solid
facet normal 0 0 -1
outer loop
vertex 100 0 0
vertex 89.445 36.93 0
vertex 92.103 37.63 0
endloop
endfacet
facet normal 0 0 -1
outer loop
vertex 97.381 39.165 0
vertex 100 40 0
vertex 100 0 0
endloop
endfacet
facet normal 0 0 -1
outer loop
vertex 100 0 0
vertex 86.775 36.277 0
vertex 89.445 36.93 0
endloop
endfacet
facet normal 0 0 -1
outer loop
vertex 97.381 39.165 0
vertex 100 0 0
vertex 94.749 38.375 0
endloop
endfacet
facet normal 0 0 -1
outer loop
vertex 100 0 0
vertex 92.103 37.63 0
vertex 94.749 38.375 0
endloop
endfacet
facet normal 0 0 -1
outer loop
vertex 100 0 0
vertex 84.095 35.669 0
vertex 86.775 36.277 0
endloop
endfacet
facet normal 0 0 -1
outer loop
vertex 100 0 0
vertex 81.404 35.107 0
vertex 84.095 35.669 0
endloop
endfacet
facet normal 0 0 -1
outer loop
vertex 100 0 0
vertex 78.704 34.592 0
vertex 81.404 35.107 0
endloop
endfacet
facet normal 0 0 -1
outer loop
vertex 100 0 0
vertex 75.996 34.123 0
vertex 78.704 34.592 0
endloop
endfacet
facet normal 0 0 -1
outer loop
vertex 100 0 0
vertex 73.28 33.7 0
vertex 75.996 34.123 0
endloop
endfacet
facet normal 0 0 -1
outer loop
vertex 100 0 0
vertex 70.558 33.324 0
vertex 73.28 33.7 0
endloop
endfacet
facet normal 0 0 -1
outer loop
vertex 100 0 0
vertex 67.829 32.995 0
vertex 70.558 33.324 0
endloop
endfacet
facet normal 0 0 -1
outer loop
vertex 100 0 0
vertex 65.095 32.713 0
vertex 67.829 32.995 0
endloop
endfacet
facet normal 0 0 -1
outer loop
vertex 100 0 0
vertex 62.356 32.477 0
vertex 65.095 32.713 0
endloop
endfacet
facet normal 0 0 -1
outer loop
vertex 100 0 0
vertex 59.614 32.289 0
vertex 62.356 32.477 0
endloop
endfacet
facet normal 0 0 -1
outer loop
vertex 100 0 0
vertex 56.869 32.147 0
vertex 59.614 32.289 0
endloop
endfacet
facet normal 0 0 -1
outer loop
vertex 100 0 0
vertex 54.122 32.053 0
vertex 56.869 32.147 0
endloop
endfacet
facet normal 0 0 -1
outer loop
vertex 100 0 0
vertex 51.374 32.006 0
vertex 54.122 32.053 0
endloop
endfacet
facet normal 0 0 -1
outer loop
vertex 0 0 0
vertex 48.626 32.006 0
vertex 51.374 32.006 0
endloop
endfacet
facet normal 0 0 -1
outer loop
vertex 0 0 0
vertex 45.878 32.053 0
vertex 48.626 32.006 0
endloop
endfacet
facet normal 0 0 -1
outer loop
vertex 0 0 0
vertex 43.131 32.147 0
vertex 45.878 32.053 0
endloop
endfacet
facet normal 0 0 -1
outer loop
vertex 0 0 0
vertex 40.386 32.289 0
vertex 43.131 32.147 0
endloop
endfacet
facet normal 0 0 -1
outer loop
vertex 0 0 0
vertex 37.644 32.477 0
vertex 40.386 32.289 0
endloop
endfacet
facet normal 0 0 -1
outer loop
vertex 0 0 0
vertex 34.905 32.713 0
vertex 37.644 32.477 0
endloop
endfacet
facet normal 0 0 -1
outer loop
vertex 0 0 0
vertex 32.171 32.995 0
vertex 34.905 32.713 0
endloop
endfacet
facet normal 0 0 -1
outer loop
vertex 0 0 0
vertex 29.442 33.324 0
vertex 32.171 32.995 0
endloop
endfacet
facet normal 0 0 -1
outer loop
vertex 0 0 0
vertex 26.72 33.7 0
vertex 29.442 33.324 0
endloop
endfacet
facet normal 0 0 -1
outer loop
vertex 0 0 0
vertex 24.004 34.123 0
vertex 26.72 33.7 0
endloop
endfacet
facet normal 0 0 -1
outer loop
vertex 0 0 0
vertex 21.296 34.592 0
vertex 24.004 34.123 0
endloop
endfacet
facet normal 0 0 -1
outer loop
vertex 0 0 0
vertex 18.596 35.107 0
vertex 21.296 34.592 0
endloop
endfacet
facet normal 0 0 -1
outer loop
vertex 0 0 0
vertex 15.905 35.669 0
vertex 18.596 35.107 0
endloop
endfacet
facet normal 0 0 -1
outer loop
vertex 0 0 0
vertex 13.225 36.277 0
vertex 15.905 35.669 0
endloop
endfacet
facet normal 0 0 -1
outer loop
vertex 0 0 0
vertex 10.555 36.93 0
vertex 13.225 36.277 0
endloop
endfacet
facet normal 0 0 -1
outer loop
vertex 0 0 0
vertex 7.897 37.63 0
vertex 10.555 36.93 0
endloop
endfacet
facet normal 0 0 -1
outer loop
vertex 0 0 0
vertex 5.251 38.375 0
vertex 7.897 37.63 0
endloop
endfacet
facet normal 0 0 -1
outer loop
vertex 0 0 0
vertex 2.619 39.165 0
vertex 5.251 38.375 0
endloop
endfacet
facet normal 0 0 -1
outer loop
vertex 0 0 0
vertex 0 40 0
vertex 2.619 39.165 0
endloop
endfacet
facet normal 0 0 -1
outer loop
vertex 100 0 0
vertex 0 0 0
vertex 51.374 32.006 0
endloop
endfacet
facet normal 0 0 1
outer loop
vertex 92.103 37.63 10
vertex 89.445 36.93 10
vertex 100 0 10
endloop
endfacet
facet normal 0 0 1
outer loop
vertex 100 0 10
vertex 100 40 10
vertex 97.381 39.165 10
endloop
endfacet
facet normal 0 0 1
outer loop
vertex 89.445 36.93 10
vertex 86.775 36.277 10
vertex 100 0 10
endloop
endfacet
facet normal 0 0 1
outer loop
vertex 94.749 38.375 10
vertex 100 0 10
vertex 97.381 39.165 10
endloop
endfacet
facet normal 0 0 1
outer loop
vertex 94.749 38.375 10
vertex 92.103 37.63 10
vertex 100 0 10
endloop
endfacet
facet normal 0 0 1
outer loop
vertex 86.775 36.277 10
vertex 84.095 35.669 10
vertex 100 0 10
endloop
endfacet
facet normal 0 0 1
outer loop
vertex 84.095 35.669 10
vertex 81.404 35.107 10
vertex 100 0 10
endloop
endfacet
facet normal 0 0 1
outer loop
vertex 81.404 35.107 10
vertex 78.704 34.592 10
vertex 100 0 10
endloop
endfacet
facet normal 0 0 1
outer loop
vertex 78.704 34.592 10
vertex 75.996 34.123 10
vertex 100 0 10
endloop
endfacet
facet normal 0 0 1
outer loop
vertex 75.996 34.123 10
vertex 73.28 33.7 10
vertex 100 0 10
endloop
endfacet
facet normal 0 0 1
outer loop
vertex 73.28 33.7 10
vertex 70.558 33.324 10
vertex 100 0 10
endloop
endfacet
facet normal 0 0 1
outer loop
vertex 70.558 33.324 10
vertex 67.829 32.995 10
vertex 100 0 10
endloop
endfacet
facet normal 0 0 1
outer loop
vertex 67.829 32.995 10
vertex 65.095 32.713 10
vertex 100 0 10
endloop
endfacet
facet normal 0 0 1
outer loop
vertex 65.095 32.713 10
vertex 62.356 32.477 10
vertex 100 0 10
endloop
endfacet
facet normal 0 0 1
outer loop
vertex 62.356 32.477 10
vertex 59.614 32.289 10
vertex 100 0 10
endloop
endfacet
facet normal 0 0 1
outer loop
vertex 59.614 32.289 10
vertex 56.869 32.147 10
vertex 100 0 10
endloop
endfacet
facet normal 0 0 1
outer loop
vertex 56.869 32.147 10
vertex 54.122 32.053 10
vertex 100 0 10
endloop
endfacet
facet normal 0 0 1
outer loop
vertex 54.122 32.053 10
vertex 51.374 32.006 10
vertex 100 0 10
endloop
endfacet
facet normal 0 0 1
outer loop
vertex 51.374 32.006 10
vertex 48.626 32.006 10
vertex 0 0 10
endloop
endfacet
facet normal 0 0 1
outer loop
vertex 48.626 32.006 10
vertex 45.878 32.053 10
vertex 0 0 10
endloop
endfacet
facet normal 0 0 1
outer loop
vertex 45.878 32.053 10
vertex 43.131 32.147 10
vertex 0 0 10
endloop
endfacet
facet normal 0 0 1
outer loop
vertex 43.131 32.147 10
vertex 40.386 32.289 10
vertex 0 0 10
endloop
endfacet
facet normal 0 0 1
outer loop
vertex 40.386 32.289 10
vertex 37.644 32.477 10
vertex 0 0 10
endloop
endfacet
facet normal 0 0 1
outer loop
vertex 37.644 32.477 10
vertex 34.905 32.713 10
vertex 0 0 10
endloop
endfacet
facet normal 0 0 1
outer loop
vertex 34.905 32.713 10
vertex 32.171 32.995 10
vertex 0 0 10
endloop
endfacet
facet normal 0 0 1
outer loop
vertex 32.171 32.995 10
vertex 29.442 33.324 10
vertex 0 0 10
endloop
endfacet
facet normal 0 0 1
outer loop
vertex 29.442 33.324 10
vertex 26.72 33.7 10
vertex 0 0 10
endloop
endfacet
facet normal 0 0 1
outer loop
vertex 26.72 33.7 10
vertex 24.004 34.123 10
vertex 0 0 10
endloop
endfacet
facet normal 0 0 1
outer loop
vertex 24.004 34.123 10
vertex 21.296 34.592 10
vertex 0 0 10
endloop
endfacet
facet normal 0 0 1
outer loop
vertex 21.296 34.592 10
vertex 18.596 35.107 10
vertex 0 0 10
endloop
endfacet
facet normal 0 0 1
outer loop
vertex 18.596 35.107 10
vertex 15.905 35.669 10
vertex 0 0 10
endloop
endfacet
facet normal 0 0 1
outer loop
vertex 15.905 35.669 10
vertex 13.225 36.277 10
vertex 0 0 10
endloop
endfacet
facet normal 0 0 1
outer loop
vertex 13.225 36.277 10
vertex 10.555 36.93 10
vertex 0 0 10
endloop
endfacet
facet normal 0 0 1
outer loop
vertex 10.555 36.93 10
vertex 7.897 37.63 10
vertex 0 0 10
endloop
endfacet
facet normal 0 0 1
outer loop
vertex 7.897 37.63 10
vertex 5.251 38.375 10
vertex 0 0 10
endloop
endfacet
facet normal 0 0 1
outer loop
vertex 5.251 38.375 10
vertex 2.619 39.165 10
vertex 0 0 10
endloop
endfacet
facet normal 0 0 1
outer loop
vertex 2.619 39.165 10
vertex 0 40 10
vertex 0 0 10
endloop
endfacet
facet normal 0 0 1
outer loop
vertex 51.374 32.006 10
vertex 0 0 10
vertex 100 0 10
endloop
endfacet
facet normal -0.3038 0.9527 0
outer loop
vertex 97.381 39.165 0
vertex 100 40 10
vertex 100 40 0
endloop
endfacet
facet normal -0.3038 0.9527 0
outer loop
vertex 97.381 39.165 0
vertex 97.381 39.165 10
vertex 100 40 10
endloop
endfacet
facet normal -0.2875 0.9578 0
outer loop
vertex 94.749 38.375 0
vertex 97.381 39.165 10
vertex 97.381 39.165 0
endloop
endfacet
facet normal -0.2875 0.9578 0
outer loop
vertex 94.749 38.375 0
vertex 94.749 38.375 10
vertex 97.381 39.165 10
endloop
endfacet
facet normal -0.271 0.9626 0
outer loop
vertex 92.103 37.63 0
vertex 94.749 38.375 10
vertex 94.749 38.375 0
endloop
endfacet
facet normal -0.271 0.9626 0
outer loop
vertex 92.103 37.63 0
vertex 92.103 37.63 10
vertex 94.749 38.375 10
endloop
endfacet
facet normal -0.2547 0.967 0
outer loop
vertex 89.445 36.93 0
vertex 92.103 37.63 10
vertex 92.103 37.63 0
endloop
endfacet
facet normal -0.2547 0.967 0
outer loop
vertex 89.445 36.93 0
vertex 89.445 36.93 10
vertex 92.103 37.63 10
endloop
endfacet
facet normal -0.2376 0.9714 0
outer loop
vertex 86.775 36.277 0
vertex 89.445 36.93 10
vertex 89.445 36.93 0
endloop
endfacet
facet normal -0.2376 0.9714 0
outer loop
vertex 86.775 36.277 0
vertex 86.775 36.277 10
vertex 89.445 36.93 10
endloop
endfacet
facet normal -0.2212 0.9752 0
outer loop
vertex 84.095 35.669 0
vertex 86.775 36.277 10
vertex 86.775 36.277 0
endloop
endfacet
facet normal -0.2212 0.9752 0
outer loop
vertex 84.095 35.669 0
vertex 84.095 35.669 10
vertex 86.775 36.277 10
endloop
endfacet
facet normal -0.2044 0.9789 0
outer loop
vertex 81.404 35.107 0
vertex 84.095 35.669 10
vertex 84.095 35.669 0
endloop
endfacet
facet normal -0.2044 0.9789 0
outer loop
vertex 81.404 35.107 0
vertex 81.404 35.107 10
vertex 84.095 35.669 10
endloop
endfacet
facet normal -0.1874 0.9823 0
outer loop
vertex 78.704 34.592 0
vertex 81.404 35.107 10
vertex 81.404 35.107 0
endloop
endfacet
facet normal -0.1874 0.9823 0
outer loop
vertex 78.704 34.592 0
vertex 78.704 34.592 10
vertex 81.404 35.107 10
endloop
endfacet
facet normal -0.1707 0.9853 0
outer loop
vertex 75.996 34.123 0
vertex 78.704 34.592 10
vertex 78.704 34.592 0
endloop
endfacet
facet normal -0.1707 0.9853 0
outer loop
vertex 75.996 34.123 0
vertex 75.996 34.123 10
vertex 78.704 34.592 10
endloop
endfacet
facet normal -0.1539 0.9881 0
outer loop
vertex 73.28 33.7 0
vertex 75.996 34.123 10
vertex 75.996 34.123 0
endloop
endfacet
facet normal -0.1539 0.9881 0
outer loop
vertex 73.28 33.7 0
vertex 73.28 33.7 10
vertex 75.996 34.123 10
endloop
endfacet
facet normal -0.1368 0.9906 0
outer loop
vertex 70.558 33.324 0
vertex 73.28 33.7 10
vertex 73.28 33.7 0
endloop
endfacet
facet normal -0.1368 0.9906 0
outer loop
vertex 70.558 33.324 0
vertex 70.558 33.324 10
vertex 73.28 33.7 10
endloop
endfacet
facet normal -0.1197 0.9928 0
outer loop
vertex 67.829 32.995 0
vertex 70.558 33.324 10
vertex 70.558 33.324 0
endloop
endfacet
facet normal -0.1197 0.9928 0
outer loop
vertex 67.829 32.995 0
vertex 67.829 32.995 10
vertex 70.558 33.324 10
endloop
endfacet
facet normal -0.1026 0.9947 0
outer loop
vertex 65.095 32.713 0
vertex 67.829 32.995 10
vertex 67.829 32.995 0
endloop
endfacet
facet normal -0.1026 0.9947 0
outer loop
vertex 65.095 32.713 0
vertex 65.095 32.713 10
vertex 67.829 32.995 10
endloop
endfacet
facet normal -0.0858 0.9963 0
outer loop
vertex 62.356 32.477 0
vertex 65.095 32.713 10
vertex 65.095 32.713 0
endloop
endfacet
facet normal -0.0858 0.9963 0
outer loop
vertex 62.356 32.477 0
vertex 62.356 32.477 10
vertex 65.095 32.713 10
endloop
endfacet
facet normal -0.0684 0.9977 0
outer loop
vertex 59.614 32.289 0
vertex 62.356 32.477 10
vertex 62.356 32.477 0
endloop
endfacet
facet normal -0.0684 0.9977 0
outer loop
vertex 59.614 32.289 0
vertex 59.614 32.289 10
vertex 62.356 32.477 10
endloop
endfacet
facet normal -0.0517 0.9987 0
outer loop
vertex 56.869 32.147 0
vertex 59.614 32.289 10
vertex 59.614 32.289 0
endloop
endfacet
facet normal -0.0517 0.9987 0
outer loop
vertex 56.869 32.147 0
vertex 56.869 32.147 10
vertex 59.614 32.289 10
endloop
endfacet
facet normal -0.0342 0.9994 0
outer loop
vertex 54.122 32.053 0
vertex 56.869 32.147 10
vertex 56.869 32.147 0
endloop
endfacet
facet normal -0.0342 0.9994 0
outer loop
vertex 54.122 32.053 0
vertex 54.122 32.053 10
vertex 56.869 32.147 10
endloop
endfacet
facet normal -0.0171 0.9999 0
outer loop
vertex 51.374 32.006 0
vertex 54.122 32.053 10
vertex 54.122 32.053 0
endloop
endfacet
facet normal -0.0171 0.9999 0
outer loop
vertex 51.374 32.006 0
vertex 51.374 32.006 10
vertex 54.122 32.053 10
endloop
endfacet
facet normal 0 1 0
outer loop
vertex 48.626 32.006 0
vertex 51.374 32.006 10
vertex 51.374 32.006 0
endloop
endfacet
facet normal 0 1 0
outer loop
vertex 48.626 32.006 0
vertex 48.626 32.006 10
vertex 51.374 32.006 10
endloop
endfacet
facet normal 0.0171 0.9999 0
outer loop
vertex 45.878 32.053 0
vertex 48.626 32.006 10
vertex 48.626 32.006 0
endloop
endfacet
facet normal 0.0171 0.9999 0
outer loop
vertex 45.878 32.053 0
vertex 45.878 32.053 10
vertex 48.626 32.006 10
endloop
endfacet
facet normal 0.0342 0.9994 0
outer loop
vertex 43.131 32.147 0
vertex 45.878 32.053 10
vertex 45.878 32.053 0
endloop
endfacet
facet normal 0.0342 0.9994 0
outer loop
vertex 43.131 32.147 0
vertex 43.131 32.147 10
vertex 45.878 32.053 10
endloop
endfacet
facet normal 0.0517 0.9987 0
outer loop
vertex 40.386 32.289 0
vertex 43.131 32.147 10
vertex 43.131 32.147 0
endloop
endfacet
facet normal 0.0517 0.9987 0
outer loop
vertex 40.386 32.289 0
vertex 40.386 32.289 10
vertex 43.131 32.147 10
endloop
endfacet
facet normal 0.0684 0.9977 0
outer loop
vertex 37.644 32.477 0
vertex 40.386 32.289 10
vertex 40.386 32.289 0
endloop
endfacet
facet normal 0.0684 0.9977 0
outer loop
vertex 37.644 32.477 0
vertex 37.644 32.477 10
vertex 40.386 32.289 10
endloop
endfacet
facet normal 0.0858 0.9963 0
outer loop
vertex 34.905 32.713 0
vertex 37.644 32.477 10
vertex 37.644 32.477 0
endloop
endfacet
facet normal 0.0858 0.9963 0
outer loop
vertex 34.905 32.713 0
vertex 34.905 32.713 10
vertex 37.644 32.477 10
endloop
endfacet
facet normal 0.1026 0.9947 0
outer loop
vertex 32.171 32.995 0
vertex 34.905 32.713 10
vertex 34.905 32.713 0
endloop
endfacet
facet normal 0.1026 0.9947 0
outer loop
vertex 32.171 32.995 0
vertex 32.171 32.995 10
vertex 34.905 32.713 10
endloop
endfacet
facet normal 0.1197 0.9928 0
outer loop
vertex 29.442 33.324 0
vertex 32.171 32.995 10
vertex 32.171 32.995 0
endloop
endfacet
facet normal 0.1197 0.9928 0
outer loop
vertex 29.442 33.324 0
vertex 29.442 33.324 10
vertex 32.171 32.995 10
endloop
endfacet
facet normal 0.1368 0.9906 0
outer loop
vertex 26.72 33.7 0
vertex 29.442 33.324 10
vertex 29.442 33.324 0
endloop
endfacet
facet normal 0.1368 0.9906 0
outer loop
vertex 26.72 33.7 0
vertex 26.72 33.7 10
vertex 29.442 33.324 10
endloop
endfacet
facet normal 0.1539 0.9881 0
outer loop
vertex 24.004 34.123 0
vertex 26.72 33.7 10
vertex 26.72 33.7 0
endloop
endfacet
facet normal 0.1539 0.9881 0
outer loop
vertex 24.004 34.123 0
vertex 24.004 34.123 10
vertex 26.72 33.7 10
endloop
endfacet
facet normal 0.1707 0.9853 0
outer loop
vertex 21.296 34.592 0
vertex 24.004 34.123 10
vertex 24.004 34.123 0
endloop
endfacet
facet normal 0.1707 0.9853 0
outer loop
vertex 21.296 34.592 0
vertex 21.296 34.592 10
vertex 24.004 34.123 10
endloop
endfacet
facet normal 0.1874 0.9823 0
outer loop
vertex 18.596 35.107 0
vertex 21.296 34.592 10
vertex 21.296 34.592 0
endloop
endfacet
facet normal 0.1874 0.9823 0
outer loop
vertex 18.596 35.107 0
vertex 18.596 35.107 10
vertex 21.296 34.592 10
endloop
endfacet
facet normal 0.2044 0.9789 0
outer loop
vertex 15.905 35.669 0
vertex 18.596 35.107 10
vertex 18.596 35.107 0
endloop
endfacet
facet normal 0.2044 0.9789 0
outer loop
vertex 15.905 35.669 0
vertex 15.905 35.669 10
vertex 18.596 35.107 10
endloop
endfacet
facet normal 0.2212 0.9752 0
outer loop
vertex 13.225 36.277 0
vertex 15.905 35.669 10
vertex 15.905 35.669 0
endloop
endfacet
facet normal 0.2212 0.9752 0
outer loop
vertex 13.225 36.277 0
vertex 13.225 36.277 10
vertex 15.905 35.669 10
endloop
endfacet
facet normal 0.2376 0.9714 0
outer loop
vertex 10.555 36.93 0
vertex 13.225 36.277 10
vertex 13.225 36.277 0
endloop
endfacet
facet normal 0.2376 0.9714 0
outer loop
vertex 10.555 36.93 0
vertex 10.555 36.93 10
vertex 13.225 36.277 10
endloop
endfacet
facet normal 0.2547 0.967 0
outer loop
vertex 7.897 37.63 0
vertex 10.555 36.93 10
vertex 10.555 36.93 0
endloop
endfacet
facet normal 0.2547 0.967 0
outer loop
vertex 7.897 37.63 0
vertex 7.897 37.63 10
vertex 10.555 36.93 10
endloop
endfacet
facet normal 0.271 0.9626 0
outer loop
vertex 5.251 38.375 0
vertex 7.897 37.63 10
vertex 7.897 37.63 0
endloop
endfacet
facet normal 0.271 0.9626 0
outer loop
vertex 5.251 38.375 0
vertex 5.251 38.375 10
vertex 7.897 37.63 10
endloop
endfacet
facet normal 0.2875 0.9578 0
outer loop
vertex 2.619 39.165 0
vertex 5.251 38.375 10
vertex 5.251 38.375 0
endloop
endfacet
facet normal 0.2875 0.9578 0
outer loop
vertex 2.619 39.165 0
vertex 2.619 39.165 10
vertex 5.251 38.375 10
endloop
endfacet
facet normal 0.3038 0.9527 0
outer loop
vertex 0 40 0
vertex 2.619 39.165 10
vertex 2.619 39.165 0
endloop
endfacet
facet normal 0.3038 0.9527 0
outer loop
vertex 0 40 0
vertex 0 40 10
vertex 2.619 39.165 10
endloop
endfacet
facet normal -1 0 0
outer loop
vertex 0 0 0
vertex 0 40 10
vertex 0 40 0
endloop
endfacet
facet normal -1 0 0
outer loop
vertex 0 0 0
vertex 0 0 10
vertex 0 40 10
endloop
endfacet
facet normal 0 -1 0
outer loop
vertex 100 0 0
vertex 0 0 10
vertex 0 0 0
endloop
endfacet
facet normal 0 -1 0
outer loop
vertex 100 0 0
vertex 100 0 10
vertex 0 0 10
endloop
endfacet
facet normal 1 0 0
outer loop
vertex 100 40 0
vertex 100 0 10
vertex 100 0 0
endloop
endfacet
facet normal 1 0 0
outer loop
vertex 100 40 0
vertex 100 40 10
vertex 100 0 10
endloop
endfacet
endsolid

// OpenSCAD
$fn = 32;

// ----------------------------------------------------------------------
// Arc profile plate: notch, 40 points
// ----------------------------------------------------------------------

// --- parameters (mm) ---
bar_l = 100;              // bar length, X
bar_w = 40;               // bar width, Y
notch_depth = 8;          // depth of the arc notch at mid-span
arc_r = 160.25;           // radius of the notch arc
arc_angle = 36.36;        // notch arc angle, degrees
arc_step = 1;             // sampling step of the notch arc, degrees
plate_t = 10;             // plate thickness, Z

profile = [[0, 0], [100, 0], [100, 40], [97.381, 39.165], [94.749, 38.375], [92.103, 37.63], [89.445, 36.93], [86.775, 36.277], [84.095, 35.669], [81.404, 35.107], [78.704, 34.592], [75.996, 34.123], [73.28, 33.7], [70.558, 33.324], [67.829, 32.995], [65.095, 32.713], [62.356, 32.477], [59.614, 32.289], [56.869, 32.147], [54.122, 32.053], [51.374, 32.006], [48.626, 32.006], [45.878, 32.053], [43.131, 32.147], [40.386, 32.289], [37.644, 32.477], [34.905, 32.713], [32.171, 32.995], [29.442, 33.324], [26.72, 33.7], [24.004, 34.123], [21.296, 34.592], [18.596, 35.107], [15.905, 35.669], [13.225, 36.277], [10.555, 36.93], [7.897, 37.63], [5.251, 38.375], [2.619, 39.165], [0, 40]];  // primary outline, 40 points, counter clockwise

// --- the one profile operation ---
linear_extrude(height = plate_t) polygon(points = profile);
